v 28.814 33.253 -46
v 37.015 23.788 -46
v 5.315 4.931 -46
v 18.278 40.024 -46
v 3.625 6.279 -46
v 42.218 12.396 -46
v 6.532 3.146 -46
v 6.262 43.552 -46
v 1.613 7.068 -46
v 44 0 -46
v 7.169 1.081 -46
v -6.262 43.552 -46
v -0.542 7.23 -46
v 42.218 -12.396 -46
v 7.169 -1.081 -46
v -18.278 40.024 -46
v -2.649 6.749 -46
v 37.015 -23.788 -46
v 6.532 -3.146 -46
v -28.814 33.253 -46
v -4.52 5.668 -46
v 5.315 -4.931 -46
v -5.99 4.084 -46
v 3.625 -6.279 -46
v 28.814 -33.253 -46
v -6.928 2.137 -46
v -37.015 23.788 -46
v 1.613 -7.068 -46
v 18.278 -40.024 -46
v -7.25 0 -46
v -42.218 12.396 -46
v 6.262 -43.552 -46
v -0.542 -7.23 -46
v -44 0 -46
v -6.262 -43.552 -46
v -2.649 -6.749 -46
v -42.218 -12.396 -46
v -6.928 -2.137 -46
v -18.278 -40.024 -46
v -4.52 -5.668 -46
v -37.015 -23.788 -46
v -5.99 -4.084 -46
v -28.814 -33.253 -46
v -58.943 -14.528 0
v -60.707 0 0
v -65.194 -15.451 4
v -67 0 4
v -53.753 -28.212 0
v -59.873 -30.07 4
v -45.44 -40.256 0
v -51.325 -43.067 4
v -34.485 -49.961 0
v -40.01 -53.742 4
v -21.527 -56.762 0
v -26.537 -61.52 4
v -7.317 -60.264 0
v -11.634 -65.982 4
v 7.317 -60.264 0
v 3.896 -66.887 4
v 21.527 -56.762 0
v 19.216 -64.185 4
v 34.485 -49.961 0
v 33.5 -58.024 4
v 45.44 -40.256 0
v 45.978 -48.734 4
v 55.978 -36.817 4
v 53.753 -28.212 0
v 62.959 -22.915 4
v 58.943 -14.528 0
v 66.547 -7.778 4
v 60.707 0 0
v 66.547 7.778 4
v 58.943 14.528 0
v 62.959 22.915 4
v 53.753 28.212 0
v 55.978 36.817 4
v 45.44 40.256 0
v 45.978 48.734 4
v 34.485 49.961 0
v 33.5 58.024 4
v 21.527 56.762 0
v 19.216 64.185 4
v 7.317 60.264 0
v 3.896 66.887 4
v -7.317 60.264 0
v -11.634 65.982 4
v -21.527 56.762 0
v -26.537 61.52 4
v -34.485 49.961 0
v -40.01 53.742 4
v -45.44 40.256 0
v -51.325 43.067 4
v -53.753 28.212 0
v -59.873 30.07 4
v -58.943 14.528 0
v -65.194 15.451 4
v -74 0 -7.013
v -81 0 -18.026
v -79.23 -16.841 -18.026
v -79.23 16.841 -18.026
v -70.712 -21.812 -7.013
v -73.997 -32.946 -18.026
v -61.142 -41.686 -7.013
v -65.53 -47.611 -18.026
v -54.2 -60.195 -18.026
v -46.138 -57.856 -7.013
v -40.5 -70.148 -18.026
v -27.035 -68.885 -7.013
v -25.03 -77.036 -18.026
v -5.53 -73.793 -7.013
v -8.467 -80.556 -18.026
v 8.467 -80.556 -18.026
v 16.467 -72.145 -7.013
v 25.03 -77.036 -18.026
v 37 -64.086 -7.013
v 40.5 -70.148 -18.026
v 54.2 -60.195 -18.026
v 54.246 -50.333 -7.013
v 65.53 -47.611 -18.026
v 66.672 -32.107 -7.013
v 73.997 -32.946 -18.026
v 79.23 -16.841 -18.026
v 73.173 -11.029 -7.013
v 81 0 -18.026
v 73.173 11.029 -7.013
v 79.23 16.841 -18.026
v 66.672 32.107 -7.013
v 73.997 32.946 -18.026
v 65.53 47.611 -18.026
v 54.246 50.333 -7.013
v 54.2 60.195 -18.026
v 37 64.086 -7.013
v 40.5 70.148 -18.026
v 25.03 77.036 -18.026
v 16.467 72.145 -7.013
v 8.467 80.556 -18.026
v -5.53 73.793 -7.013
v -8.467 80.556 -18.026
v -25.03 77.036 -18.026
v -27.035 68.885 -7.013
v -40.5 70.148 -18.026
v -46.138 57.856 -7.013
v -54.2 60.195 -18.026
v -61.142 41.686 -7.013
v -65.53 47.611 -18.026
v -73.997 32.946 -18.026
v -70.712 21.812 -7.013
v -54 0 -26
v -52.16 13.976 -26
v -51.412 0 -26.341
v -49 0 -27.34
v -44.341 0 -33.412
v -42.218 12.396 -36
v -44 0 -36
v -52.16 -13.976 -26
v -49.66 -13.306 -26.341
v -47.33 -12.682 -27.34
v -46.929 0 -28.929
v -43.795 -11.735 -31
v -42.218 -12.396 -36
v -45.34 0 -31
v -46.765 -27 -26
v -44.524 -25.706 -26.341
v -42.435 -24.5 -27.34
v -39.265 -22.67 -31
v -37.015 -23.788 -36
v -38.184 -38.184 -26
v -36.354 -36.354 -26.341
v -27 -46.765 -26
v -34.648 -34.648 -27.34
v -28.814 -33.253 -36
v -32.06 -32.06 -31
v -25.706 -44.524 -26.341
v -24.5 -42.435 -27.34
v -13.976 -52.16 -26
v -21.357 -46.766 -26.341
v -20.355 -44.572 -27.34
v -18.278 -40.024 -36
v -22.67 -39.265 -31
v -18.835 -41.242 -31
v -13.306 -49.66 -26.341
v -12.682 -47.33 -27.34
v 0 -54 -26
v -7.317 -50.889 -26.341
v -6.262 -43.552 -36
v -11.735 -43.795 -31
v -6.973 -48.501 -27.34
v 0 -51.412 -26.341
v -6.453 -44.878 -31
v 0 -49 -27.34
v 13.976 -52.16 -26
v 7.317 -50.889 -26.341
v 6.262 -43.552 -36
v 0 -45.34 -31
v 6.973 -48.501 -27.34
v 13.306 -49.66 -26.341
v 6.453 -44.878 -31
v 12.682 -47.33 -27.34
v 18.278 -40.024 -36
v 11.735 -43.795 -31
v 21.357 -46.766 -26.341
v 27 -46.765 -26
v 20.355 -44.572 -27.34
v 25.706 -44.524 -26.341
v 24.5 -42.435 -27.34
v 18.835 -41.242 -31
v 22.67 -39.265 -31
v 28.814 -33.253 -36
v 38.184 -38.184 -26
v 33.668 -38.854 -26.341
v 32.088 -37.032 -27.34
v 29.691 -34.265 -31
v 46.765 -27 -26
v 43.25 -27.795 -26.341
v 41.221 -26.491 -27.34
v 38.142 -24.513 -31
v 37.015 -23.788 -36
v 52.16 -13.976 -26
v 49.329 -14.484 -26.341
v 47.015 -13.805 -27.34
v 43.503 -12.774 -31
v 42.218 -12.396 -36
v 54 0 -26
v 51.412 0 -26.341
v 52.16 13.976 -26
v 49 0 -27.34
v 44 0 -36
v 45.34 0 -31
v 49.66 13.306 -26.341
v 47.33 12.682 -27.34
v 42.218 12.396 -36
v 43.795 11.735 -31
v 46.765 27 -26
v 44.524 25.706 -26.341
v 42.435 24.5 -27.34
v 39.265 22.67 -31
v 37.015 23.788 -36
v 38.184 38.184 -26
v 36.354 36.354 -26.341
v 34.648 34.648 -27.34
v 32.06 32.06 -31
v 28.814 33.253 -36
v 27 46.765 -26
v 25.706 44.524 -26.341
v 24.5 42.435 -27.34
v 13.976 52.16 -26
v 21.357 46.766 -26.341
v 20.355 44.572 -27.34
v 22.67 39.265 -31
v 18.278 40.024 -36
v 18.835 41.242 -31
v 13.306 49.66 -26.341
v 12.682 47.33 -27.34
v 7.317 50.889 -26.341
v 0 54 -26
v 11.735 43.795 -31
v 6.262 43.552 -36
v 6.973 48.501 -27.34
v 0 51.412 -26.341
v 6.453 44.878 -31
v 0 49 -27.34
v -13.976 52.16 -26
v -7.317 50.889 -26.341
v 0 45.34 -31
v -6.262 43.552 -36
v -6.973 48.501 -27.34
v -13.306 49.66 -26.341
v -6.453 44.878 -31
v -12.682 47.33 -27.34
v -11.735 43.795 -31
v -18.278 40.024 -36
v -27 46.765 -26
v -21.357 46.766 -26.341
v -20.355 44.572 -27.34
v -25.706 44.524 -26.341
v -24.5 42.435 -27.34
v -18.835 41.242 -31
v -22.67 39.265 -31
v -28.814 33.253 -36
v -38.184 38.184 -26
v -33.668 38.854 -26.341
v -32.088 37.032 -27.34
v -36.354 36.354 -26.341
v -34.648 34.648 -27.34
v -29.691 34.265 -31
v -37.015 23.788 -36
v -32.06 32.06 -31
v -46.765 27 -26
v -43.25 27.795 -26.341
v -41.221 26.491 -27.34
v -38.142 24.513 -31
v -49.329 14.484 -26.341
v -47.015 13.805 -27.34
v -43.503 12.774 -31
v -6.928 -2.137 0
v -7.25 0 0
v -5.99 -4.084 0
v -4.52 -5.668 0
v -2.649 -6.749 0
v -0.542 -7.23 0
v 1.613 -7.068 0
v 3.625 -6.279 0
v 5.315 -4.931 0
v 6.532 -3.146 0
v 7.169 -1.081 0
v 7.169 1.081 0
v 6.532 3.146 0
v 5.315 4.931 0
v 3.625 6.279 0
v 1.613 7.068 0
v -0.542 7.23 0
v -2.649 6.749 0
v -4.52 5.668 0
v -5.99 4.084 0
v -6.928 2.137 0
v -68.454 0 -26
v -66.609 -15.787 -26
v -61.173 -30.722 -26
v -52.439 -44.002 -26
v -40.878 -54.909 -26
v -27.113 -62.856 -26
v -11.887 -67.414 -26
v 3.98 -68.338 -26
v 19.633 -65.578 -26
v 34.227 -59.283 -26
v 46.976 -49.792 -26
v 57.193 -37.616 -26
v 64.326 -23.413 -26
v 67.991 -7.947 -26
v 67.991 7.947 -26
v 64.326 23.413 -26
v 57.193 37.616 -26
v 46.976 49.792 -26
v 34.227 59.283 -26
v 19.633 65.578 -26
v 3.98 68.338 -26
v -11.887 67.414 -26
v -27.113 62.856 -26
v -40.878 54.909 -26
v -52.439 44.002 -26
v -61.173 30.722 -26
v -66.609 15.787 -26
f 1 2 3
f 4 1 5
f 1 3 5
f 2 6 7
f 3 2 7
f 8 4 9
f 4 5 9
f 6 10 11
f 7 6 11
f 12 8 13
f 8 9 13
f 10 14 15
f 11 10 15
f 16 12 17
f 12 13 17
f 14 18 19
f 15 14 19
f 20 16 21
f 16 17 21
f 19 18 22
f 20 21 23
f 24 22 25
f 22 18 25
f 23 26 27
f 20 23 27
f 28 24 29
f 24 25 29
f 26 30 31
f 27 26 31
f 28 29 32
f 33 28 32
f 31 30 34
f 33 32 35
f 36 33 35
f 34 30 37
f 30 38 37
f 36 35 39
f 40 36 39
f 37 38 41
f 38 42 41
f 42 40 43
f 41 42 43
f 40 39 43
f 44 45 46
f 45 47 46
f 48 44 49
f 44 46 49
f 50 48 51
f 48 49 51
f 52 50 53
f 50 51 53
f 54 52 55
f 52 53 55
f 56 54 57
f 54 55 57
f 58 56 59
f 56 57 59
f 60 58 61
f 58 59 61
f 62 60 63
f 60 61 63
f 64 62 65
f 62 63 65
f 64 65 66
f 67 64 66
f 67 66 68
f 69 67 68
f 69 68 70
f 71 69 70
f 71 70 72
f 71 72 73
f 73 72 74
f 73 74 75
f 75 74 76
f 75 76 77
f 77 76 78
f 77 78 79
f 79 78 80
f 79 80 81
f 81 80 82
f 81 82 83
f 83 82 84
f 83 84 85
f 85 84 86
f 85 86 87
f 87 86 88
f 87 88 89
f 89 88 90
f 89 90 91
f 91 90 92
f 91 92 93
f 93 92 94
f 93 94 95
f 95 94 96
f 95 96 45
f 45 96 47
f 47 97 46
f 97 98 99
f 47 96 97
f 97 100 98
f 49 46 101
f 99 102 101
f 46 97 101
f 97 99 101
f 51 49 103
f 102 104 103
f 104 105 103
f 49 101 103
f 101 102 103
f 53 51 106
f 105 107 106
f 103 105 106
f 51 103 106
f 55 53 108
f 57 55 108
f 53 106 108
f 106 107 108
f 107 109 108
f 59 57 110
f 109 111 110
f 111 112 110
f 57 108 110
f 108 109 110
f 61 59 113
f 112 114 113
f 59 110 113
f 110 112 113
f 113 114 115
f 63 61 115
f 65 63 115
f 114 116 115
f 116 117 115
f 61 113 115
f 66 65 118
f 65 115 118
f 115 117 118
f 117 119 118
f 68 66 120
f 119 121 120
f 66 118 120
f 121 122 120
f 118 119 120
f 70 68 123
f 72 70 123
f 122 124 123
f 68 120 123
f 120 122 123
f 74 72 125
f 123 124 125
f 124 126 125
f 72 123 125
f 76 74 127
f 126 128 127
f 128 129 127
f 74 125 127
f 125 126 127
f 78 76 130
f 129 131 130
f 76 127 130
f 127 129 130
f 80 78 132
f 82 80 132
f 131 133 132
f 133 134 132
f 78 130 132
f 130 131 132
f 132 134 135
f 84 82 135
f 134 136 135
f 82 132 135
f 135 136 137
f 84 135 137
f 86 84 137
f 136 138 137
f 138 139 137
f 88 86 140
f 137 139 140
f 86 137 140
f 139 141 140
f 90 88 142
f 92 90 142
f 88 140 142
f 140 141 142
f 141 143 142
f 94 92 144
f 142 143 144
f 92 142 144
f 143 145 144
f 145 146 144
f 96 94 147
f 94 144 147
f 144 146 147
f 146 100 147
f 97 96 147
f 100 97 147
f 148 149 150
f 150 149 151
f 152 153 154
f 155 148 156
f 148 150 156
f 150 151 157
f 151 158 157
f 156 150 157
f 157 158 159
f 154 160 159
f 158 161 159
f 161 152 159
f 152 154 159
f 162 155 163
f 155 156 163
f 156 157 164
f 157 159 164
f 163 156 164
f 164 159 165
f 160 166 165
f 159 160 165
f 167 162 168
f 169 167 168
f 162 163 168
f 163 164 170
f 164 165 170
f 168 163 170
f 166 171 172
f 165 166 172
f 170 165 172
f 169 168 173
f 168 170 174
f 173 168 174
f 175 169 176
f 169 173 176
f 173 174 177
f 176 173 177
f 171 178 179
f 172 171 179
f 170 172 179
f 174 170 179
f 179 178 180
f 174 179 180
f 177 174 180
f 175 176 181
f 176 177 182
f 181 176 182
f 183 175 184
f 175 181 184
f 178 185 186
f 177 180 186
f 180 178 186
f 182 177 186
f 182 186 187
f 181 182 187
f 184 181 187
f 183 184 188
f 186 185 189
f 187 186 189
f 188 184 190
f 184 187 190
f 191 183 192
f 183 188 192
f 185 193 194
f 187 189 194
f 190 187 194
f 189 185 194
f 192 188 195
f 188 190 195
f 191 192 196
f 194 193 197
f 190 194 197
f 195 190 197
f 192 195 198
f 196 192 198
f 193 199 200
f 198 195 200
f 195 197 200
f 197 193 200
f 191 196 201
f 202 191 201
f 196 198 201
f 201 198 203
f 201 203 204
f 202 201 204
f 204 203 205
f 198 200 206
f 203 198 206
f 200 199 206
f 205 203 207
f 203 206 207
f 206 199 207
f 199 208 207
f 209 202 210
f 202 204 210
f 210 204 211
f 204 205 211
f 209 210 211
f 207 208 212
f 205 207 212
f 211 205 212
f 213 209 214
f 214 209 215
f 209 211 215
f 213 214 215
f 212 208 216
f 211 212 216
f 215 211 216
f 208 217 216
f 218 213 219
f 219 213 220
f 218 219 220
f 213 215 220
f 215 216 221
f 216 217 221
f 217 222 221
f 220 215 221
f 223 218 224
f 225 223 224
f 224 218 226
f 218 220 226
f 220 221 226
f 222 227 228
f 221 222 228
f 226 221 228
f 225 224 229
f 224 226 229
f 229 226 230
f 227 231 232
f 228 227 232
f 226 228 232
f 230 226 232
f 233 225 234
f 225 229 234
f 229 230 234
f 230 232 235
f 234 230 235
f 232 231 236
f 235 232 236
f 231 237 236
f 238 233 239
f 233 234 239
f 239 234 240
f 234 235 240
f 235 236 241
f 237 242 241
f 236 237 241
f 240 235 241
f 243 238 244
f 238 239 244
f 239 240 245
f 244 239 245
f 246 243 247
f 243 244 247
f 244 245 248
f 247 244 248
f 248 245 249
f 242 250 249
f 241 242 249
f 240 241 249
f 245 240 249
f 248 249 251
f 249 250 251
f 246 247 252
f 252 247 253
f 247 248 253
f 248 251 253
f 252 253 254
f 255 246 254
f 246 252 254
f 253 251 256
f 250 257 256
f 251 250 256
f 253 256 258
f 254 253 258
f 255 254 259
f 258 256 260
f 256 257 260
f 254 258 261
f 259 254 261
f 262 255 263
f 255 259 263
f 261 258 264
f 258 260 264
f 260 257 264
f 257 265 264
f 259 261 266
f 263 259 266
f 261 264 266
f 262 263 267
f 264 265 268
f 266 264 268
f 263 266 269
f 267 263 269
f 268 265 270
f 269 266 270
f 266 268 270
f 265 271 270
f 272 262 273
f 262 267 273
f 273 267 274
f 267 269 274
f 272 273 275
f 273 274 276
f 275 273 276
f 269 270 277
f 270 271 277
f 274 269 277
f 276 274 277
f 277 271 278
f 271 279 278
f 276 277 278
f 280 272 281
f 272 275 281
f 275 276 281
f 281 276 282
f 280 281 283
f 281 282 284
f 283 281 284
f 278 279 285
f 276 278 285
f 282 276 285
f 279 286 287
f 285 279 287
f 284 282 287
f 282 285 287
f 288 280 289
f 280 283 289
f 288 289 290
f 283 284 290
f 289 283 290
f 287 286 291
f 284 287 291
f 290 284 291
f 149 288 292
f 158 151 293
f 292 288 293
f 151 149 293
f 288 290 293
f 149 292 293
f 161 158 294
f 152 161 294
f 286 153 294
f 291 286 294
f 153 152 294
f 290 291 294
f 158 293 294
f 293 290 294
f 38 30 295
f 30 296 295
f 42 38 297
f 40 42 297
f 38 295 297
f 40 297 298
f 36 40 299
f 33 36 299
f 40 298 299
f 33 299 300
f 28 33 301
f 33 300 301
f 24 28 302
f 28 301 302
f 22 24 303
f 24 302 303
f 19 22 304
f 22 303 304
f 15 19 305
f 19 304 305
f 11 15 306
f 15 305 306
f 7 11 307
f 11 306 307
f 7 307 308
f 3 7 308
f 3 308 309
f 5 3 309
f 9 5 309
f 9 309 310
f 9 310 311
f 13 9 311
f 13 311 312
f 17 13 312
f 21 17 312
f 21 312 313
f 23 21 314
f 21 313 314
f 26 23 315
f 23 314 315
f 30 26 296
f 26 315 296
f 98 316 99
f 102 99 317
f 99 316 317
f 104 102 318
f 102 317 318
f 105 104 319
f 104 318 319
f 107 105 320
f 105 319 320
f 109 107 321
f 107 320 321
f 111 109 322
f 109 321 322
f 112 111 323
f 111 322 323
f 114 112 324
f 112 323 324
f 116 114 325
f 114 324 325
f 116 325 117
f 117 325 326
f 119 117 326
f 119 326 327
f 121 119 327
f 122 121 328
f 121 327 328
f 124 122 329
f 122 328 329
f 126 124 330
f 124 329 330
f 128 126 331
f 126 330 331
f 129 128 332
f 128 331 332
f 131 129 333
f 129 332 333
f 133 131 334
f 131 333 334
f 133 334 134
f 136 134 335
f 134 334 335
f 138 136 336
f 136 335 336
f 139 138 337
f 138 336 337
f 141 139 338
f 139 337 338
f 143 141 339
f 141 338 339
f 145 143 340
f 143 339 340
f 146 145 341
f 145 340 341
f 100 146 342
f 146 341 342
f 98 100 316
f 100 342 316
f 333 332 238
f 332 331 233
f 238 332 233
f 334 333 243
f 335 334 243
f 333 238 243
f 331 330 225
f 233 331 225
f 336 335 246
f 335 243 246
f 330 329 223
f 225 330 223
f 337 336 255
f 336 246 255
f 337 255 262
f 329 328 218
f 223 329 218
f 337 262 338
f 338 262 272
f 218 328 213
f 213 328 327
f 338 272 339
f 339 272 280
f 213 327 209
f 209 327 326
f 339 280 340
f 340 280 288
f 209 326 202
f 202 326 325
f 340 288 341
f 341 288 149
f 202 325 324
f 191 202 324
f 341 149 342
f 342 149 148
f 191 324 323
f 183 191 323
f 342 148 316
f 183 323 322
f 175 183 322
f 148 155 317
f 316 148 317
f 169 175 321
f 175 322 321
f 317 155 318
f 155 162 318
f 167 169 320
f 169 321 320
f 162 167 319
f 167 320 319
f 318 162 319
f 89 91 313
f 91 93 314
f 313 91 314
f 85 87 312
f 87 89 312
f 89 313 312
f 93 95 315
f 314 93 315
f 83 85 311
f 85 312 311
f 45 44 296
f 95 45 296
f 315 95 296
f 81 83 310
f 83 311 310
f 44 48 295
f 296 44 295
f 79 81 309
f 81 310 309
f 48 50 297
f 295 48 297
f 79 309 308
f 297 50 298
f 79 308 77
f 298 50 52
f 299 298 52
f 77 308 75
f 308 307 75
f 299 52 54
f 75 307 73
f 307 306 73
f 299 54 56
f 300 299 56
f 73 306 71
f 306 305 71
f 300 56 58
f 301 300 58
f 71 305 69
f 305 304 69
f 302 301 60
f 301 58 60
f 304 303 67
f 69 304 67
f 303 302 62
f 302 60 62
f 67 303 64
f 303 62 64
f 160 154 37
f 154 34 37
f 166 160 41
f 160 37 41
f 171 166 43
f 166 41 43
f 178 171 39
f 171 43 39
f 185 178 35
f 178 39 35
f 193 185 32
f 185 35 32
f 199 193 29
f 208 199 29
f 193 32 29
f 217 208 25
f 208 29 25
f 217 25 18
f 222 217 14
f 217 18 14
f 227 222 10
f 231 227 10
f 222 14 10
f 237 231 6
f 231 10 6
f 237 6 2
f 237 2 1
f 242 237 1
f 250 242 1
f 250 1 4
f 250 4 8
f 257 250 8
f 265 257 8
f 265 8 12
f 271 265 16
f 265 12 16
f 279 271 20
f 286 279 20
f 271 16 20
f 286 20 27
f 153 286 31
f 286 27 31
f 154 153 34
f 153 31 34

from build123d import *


with BuildPart() as part:
    # Çizim1 → Döndür1 (revolve)
    with BuildSketch(Plane(origin=(0, 0, 0), x_dir=(0, 0, -1), z_dir=(1, 0, 0)), mode=Mode.PRIVATE) as d_nd_r1_sk:
        with BuildLine():
            Line((0, 7.25), (0, 60.706950554))
            Line((0, 60.706950554), (-4, 67))
            Line((-4, 67), (18.02567306, 81))
            Line((18.02567306, 81), (26, 68.454291568))
            Line((26, 68.454291568), (26, 54))
            ThreePointArc((26, 54), (28.928932188, 46.928932188), (36, 44))
            Line((36, 44), (46, 44))
            Line((46, 44), (46, 7.25))
            Line((46, 7.25), (0, 7.25))
        make_face()
    revolve(d_nd_r1_sk.sketch.rotate(Axis((0, 0, -100.24473813), (0, 0, 1)), 90), axis=Axis((0, 0, -100.24473813), (0, 0, 1)))


solid = part.part
